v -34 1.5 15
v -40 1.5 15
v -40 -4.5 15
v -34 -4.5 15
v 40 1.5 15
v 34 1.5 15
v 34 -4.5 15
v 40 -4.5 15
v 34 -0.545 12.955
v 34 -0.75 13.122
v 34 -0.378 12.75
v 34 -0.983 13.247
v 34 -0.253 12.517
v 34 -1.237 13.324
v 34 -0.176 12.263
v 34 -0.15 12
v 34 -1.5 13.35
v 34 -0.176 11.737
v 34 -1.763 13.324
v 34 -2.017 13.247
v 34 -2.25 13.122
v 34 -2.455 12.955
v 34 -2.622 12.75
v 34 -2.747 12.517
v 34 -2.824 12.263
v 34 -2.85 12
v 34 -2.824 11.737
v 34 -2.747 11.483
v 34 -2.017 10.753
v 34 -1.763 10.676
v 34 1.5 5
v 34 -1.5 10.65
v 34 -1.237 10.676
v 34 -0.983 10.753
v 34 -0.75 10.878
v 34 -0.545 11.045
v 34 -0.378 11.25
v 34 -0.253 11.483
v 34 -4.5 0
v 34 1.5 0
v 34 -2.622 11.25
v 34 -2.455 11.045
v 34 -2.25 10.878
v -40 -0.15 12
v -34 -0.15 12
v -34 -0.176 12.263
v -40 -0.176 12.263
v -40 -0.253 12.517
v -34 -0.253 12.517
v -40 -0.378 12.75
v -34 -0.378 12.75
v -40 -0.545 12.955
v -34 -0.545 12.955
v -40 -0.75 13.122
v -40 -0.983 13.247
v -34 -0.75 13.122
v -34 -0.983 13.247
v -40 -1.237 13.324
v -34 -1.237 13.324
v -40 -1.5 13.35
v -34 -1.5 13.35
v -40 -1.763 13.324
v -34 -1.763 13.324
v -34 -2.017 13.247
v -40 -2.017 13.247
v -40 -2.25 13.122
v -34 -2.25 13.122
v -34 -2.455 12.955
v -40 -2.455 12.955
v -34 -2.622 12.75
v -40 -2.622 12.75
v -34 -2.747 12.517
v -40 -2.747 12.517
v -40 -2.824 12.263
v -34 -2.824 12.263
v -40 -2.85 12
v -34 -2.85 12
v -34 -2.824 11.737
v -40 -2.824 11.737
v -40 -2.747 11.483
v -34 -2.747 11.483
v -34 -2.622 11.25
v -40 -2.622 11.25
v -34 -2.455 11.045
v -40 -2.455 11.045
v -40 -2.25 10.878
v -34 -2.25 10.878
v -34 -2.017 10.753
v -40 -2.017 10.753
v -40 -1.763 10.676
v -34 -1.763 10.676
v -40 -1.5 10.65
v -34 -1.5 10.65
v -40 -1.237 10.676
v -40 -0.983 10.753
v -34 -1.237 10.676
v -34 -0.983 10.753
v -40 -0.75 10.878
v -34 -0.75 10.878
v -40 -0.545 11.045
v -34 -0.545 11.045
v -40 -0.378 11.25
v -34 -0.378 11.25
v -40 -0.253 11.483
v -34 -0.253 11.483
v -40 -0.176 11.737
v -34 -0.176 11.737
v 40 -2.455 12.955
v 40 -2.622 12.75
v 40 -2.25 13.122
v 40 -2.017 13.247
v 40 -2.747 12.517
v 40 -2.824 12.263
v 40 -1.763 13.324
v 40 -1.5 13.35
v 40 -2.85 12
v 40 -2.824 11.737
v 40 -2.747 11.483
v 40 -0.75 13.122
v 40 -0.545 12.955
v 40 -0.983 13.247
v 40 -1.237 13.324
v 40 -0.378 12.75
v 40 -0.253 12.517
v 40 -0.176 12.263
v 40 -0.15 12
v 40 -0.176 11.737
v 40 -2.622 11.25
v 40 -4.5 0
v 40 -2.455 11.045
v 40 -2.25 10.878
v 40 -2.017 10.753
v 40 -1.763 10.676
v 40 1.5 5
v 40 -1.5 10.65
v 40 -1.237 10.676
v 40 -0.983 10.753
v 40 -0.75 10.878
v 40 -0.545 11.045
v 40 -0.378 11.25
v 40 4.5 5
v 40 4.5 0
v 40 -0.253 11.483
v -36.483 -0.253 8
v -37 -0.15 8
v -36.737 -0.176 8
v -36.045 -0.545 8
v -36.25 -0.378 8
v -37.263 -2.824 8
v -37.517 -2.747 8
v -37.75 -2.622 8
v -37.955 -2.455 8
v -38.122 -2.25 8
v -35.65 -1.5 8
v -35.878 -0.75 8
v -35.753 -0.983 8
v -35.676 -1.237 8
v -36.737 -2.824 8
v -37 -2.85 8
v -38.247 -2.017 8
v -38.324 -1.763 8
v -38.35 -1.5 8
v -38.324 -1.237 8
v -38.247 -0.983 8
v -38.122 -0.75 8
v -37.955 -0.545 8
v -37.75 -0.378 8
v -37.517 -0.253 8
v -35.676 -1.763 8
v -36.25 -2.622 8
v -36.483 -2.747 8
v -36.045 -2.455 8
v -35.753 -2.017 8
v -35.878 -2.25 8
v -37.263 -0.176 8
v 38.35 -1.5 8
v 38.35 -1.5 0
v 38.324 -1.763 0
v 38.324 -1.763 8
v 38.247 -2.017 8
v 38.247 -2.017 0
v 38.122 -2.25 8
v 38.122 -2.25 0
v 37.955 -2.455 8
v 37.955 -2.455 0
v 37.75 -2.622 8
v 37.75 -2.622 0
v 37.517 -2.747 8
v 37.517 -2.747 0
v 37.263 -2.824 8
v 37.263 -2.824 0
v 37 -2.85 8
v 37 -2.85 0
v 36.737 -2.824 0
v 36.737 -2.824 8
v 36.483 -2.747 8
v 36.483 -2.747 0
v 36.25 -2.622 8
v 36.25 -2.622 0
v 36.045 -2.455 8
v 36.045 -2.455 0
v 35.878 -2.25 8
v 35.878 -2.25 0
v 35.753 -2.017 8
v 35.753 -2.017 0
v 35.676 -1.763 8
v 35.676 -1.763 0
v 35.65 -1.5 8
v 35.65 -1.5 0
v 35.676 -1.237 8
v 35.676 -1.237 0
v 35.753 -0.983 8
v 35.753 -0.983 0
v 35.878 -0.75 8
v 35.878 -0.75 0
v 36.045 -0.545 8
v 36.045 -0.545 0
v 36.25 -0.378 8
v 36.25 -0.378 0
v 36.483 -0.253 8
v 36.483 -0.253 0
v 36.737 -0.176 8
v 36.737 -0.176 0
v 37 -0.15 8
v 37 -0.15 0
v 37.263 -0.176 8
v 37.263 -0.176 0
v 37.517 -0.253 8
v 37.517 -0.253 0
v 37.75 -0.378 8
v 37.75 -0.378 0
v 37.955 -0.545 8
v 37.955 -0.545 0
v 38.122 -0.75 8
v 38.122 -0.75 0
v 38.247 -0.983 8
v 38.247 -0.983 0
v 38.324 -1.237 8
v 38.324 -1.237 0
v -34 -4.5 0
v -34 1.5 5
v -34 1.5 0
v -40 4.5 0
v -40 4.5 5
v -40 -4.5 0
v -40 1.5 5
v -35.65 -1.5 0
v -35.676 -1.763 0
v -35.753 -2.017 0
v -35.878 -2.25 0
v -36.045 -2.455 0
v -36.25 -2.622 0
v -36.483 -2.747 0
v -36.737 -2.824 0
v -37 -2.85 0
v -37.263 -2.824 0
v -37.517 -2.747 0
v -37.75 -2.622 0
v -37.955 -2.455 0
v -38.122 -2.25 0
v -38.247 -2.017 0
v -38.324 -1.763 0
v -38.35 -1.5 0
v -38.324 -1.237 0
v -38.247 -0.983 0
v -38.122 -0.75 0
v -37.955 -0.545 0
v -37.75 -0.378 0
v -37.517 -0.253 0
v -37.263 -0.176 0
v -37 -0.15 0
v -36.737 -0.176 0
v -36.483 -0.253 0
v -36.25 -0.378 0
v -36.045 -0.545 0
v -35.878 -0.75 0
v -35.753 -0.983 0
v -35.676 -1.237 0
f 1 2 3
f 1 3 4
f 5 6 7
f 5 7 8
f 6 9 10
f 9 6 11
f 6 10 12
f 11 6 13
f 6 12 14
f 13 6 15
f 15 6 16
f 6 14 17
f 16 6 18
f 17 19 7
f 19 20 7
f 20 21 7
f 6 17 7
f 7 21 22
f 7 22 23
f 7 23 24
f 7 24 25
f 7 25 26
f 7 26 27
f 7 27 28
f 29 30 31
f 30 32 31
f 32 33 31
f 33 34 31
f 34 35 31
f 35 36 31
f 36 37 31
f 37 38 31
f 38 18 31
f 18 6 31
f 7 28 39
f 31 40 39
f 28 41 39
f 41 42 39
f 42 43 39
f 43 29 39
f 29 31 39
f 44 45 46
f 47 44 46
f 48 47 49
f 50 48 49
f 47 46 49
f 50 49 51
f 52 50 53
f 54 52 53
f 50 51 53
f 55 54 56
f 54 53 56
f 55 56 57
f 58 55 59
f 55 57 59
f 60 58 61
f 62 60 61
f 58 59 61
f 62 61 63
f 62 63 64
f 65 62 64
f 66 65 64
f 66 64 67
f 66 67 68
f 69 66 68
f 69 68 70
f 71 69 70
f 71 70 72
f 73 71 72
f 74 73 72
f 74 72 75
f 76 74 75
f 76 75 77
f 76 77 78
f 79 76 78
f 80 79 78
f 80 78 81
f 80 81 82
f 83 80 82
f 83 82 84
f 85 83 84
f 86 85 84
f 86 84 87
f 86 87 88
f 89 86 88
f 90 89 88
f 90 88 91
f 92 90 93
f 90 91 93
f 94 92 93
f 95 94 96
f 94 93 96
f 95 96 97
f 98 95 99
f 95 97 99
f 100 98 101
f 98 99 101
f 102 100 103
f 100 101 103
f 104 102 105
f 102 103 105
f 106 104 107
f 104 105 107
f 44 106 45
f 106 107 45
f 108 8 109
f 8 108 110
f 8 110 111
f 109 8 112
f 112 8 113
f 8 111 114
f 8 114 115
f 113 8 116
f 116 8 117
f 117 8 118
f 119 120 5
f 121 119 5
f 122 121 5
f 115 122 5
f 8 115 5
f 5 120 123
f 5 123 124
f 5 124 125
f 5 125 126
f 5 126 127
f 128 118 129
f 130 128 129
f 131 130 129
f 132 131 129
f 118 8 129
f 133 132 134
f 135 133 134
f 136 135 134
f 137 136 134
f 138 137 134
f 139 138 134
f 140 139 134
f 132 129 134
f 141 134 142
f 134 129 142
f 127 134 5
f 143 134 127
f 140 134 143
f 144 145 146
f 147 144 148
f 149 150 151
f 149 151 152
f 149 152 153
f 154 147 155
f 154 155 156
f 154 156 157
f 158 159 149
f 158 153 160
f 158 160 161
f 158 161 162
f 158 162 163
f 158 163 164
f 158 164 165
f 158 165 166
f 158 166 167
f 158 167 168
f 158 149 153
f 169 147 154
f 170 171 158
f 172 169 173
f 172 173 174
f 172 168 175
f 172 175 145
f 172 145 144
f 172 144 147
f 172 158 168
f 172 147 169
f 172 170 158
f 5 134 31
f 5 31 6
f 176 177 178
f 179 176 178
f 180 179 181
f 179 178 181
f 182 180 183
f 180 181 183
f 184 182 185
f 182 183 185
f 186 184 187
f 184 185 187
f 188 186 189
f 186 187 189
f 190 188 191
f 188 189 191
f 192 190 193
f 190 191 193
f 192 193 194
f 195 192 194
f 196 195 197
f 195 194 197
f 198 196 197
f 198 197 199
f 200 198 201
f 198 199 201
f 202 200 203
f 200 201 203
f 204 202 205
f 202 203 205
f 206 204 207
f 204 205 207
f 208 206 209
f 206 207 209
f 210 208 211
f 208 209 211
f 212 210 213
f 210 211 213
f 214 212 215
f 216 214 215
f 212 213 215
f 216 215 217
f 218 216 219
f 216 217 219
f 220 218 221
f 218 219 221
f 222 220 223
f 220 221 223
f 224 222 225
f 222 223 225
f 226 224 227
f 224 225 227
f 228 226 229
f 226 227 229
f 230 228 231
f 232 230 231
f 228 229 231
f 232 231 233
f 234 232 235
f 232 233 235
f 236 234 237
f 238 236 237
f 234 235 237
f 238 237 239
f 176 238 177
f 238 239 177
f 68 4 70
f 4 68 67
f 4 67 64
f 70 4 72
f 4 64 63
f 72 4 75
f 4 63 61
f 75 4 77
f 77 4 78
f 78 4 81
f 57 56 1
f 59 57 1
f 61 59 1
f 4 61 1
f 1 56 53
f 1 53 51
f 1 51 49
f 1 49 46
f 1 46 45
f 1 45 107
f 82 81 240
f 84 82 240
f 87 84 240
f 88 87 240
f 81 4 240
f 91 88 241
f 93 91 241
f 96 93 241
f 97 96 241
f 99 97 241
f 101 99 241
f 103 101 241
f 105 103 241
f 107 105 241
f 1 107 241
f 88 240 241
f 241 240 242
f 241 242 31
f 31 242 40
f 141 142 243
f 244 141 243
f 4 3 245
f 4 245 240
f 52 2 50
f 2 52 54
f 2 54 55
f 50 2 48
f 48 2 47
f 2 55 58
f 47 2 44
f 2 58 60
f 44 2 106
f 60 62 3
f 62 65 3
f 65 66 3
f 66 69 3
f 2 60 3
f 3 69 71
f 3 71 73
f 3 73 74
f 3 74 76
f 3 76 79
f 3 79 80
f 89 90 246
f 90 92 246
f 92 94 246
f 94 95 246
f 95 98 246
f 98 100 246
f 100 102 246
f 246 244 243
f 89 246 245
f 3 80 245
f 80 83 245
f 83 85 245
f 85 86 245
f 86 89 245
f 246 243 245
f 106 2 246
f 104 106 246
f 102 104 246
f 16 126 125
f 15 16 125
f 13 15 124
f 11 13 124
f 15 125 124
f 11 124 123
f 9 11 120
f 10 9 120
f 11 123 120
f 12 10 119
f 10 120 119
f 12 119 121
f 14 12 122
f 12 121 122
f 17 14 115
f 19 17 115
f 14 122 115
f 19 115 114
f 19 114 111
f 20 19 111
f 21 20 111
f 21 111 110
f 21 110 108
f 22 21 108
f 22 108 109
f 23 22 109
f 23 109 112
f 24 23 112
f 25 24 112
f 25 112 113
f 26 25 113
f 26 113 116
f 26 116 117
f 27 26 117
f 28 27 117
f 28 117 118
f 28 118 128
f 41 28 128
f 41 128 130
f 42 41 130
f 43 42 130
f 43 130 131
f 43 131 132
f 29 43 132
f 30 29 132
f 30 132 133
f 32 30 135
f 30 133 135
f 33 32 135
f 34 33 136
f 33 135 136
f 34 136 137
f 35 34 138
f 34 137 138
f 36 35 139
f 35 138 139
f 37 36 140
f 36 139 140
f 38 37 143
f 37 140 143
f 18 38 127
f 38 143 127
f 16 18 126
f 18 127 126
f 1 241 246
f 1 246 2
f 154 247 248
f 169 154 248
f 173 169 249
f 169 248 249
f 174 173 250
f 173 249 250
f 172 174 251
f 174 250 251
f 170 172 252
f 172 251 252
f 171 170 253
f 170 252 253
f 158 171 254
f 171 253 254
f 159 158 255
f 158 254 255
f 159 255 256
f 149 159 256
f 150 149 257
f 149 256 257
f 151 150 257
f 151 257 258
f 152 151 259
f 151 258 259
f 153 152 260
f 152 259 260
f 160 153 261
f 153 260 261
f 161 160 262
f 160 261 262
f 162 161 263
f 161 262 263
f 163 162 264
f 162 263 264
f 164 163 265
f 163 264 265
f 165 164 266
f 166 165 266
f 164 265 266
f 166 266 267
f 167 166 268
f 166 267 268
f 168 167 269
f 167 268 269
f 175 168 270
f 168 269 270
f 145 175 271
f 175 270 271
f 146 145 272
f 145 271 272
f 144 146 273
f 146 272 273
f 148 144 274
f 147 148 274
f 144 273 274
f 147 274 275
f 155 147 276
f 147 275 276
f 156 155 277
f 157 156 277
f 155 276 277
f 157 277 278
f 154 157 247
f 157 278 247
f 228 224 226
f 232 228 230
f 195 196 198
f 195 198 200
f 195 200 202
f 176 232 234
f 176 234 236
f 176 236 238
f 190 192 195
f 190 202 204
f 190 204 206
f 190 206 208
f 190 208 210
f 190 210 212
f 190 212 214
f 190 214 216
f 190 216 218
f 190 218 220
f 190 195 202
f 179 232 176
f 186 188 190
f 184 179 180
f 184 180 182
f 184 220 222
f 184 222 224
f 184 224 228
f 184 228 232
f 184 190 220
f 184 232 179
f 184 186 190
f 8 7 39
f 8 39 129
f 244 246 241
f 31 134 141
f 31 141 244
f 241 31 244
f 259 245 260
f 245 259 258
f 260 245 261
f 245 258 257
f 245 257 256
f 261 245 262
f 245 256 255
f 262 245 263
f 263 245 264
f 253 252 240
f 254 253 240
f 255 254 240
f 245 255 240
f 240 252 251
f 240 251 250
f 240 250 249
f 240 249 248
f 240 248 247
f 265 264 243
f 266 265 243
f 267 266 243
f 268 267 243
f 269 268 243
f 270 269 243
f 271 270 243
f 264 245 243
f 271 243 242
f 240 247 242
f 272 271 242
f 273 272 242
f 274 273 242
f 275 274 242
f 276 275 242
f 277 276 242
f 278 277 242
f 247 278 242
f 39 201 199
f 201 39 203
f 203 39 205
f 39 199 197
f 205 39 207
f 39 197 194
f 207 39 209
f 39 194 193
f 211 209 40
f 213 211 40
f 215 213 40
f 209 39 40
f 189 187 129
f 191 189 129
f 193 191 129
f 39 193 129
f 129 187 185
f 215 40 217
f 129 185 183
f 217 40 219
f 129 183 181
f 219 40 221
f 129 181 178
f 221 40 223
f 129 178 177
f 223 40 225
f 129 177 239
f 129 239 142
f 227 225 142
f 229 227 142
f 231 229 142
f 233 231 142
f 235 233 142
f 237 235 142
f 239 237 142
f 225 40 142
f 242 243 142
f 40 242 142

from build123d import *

# Parameters (mm, degrees)
F1_DEPTH = 15
F2_W     = 68
F2_H     = 3
F3_DEPTH = 10
F4_R     = 1.35
F5_DEPTH = 8
F6_W     = 3
F6_H     = 10
F6_R     = 1.35
F7_DEPTH = 80.001


with BuildPart() as f1:
    # F0 (on Top) → F1 (new body)
    with BuildSketch(Plane.XY):
        Polygon((-40, -4.5), (-34, -4.5), (-34, 1.5), (0, 1.5), (34, 1.5), (34, -4.5), (40, -4.5), (40, 4.5), (34, 4.5), (0, 4.5), (-34, 4.5), (-40, 4.5), align=None)
    extrude(amount=F1_DEPTH)

    # F2 (on face) → F3 (cut)
    with BuildSketch(Plane.XY.offset(15)):
        with Locations((0, 3)):
            Rectangle(F2_W, F2_H)
    extrude(amount=-F3_DEPTH, mode=Mode.SUBTRACT)

    # F4 (on face) → F5 (cut)
    with BuildSketch(Plane(origin=(0, 0, 0), x_dir=(1, 0, 0), z_dir=(0, 0, -1))):
        with Locations((37, 1.5)):
            Circle(F4_R)
        with Locations((-37, 1.5)):
            Circle(F4_R)
    extrude(amount=-F5_DEPTH, mode=Mode.SUBTRACT)

    # F6 (on face) → F7 (cut, through all)
    with BuildSketch(Plane.YZ.offset(40)):
        with Locations((3, 10)):
            Rectangle(F6_W, F6_H)
        with Locations((-1.5, 12)):
            Circle(F6_R)
    extrude(amount=-F7_DEPTH, mode=Mode.SUBTRACT)


solid = f1.part
